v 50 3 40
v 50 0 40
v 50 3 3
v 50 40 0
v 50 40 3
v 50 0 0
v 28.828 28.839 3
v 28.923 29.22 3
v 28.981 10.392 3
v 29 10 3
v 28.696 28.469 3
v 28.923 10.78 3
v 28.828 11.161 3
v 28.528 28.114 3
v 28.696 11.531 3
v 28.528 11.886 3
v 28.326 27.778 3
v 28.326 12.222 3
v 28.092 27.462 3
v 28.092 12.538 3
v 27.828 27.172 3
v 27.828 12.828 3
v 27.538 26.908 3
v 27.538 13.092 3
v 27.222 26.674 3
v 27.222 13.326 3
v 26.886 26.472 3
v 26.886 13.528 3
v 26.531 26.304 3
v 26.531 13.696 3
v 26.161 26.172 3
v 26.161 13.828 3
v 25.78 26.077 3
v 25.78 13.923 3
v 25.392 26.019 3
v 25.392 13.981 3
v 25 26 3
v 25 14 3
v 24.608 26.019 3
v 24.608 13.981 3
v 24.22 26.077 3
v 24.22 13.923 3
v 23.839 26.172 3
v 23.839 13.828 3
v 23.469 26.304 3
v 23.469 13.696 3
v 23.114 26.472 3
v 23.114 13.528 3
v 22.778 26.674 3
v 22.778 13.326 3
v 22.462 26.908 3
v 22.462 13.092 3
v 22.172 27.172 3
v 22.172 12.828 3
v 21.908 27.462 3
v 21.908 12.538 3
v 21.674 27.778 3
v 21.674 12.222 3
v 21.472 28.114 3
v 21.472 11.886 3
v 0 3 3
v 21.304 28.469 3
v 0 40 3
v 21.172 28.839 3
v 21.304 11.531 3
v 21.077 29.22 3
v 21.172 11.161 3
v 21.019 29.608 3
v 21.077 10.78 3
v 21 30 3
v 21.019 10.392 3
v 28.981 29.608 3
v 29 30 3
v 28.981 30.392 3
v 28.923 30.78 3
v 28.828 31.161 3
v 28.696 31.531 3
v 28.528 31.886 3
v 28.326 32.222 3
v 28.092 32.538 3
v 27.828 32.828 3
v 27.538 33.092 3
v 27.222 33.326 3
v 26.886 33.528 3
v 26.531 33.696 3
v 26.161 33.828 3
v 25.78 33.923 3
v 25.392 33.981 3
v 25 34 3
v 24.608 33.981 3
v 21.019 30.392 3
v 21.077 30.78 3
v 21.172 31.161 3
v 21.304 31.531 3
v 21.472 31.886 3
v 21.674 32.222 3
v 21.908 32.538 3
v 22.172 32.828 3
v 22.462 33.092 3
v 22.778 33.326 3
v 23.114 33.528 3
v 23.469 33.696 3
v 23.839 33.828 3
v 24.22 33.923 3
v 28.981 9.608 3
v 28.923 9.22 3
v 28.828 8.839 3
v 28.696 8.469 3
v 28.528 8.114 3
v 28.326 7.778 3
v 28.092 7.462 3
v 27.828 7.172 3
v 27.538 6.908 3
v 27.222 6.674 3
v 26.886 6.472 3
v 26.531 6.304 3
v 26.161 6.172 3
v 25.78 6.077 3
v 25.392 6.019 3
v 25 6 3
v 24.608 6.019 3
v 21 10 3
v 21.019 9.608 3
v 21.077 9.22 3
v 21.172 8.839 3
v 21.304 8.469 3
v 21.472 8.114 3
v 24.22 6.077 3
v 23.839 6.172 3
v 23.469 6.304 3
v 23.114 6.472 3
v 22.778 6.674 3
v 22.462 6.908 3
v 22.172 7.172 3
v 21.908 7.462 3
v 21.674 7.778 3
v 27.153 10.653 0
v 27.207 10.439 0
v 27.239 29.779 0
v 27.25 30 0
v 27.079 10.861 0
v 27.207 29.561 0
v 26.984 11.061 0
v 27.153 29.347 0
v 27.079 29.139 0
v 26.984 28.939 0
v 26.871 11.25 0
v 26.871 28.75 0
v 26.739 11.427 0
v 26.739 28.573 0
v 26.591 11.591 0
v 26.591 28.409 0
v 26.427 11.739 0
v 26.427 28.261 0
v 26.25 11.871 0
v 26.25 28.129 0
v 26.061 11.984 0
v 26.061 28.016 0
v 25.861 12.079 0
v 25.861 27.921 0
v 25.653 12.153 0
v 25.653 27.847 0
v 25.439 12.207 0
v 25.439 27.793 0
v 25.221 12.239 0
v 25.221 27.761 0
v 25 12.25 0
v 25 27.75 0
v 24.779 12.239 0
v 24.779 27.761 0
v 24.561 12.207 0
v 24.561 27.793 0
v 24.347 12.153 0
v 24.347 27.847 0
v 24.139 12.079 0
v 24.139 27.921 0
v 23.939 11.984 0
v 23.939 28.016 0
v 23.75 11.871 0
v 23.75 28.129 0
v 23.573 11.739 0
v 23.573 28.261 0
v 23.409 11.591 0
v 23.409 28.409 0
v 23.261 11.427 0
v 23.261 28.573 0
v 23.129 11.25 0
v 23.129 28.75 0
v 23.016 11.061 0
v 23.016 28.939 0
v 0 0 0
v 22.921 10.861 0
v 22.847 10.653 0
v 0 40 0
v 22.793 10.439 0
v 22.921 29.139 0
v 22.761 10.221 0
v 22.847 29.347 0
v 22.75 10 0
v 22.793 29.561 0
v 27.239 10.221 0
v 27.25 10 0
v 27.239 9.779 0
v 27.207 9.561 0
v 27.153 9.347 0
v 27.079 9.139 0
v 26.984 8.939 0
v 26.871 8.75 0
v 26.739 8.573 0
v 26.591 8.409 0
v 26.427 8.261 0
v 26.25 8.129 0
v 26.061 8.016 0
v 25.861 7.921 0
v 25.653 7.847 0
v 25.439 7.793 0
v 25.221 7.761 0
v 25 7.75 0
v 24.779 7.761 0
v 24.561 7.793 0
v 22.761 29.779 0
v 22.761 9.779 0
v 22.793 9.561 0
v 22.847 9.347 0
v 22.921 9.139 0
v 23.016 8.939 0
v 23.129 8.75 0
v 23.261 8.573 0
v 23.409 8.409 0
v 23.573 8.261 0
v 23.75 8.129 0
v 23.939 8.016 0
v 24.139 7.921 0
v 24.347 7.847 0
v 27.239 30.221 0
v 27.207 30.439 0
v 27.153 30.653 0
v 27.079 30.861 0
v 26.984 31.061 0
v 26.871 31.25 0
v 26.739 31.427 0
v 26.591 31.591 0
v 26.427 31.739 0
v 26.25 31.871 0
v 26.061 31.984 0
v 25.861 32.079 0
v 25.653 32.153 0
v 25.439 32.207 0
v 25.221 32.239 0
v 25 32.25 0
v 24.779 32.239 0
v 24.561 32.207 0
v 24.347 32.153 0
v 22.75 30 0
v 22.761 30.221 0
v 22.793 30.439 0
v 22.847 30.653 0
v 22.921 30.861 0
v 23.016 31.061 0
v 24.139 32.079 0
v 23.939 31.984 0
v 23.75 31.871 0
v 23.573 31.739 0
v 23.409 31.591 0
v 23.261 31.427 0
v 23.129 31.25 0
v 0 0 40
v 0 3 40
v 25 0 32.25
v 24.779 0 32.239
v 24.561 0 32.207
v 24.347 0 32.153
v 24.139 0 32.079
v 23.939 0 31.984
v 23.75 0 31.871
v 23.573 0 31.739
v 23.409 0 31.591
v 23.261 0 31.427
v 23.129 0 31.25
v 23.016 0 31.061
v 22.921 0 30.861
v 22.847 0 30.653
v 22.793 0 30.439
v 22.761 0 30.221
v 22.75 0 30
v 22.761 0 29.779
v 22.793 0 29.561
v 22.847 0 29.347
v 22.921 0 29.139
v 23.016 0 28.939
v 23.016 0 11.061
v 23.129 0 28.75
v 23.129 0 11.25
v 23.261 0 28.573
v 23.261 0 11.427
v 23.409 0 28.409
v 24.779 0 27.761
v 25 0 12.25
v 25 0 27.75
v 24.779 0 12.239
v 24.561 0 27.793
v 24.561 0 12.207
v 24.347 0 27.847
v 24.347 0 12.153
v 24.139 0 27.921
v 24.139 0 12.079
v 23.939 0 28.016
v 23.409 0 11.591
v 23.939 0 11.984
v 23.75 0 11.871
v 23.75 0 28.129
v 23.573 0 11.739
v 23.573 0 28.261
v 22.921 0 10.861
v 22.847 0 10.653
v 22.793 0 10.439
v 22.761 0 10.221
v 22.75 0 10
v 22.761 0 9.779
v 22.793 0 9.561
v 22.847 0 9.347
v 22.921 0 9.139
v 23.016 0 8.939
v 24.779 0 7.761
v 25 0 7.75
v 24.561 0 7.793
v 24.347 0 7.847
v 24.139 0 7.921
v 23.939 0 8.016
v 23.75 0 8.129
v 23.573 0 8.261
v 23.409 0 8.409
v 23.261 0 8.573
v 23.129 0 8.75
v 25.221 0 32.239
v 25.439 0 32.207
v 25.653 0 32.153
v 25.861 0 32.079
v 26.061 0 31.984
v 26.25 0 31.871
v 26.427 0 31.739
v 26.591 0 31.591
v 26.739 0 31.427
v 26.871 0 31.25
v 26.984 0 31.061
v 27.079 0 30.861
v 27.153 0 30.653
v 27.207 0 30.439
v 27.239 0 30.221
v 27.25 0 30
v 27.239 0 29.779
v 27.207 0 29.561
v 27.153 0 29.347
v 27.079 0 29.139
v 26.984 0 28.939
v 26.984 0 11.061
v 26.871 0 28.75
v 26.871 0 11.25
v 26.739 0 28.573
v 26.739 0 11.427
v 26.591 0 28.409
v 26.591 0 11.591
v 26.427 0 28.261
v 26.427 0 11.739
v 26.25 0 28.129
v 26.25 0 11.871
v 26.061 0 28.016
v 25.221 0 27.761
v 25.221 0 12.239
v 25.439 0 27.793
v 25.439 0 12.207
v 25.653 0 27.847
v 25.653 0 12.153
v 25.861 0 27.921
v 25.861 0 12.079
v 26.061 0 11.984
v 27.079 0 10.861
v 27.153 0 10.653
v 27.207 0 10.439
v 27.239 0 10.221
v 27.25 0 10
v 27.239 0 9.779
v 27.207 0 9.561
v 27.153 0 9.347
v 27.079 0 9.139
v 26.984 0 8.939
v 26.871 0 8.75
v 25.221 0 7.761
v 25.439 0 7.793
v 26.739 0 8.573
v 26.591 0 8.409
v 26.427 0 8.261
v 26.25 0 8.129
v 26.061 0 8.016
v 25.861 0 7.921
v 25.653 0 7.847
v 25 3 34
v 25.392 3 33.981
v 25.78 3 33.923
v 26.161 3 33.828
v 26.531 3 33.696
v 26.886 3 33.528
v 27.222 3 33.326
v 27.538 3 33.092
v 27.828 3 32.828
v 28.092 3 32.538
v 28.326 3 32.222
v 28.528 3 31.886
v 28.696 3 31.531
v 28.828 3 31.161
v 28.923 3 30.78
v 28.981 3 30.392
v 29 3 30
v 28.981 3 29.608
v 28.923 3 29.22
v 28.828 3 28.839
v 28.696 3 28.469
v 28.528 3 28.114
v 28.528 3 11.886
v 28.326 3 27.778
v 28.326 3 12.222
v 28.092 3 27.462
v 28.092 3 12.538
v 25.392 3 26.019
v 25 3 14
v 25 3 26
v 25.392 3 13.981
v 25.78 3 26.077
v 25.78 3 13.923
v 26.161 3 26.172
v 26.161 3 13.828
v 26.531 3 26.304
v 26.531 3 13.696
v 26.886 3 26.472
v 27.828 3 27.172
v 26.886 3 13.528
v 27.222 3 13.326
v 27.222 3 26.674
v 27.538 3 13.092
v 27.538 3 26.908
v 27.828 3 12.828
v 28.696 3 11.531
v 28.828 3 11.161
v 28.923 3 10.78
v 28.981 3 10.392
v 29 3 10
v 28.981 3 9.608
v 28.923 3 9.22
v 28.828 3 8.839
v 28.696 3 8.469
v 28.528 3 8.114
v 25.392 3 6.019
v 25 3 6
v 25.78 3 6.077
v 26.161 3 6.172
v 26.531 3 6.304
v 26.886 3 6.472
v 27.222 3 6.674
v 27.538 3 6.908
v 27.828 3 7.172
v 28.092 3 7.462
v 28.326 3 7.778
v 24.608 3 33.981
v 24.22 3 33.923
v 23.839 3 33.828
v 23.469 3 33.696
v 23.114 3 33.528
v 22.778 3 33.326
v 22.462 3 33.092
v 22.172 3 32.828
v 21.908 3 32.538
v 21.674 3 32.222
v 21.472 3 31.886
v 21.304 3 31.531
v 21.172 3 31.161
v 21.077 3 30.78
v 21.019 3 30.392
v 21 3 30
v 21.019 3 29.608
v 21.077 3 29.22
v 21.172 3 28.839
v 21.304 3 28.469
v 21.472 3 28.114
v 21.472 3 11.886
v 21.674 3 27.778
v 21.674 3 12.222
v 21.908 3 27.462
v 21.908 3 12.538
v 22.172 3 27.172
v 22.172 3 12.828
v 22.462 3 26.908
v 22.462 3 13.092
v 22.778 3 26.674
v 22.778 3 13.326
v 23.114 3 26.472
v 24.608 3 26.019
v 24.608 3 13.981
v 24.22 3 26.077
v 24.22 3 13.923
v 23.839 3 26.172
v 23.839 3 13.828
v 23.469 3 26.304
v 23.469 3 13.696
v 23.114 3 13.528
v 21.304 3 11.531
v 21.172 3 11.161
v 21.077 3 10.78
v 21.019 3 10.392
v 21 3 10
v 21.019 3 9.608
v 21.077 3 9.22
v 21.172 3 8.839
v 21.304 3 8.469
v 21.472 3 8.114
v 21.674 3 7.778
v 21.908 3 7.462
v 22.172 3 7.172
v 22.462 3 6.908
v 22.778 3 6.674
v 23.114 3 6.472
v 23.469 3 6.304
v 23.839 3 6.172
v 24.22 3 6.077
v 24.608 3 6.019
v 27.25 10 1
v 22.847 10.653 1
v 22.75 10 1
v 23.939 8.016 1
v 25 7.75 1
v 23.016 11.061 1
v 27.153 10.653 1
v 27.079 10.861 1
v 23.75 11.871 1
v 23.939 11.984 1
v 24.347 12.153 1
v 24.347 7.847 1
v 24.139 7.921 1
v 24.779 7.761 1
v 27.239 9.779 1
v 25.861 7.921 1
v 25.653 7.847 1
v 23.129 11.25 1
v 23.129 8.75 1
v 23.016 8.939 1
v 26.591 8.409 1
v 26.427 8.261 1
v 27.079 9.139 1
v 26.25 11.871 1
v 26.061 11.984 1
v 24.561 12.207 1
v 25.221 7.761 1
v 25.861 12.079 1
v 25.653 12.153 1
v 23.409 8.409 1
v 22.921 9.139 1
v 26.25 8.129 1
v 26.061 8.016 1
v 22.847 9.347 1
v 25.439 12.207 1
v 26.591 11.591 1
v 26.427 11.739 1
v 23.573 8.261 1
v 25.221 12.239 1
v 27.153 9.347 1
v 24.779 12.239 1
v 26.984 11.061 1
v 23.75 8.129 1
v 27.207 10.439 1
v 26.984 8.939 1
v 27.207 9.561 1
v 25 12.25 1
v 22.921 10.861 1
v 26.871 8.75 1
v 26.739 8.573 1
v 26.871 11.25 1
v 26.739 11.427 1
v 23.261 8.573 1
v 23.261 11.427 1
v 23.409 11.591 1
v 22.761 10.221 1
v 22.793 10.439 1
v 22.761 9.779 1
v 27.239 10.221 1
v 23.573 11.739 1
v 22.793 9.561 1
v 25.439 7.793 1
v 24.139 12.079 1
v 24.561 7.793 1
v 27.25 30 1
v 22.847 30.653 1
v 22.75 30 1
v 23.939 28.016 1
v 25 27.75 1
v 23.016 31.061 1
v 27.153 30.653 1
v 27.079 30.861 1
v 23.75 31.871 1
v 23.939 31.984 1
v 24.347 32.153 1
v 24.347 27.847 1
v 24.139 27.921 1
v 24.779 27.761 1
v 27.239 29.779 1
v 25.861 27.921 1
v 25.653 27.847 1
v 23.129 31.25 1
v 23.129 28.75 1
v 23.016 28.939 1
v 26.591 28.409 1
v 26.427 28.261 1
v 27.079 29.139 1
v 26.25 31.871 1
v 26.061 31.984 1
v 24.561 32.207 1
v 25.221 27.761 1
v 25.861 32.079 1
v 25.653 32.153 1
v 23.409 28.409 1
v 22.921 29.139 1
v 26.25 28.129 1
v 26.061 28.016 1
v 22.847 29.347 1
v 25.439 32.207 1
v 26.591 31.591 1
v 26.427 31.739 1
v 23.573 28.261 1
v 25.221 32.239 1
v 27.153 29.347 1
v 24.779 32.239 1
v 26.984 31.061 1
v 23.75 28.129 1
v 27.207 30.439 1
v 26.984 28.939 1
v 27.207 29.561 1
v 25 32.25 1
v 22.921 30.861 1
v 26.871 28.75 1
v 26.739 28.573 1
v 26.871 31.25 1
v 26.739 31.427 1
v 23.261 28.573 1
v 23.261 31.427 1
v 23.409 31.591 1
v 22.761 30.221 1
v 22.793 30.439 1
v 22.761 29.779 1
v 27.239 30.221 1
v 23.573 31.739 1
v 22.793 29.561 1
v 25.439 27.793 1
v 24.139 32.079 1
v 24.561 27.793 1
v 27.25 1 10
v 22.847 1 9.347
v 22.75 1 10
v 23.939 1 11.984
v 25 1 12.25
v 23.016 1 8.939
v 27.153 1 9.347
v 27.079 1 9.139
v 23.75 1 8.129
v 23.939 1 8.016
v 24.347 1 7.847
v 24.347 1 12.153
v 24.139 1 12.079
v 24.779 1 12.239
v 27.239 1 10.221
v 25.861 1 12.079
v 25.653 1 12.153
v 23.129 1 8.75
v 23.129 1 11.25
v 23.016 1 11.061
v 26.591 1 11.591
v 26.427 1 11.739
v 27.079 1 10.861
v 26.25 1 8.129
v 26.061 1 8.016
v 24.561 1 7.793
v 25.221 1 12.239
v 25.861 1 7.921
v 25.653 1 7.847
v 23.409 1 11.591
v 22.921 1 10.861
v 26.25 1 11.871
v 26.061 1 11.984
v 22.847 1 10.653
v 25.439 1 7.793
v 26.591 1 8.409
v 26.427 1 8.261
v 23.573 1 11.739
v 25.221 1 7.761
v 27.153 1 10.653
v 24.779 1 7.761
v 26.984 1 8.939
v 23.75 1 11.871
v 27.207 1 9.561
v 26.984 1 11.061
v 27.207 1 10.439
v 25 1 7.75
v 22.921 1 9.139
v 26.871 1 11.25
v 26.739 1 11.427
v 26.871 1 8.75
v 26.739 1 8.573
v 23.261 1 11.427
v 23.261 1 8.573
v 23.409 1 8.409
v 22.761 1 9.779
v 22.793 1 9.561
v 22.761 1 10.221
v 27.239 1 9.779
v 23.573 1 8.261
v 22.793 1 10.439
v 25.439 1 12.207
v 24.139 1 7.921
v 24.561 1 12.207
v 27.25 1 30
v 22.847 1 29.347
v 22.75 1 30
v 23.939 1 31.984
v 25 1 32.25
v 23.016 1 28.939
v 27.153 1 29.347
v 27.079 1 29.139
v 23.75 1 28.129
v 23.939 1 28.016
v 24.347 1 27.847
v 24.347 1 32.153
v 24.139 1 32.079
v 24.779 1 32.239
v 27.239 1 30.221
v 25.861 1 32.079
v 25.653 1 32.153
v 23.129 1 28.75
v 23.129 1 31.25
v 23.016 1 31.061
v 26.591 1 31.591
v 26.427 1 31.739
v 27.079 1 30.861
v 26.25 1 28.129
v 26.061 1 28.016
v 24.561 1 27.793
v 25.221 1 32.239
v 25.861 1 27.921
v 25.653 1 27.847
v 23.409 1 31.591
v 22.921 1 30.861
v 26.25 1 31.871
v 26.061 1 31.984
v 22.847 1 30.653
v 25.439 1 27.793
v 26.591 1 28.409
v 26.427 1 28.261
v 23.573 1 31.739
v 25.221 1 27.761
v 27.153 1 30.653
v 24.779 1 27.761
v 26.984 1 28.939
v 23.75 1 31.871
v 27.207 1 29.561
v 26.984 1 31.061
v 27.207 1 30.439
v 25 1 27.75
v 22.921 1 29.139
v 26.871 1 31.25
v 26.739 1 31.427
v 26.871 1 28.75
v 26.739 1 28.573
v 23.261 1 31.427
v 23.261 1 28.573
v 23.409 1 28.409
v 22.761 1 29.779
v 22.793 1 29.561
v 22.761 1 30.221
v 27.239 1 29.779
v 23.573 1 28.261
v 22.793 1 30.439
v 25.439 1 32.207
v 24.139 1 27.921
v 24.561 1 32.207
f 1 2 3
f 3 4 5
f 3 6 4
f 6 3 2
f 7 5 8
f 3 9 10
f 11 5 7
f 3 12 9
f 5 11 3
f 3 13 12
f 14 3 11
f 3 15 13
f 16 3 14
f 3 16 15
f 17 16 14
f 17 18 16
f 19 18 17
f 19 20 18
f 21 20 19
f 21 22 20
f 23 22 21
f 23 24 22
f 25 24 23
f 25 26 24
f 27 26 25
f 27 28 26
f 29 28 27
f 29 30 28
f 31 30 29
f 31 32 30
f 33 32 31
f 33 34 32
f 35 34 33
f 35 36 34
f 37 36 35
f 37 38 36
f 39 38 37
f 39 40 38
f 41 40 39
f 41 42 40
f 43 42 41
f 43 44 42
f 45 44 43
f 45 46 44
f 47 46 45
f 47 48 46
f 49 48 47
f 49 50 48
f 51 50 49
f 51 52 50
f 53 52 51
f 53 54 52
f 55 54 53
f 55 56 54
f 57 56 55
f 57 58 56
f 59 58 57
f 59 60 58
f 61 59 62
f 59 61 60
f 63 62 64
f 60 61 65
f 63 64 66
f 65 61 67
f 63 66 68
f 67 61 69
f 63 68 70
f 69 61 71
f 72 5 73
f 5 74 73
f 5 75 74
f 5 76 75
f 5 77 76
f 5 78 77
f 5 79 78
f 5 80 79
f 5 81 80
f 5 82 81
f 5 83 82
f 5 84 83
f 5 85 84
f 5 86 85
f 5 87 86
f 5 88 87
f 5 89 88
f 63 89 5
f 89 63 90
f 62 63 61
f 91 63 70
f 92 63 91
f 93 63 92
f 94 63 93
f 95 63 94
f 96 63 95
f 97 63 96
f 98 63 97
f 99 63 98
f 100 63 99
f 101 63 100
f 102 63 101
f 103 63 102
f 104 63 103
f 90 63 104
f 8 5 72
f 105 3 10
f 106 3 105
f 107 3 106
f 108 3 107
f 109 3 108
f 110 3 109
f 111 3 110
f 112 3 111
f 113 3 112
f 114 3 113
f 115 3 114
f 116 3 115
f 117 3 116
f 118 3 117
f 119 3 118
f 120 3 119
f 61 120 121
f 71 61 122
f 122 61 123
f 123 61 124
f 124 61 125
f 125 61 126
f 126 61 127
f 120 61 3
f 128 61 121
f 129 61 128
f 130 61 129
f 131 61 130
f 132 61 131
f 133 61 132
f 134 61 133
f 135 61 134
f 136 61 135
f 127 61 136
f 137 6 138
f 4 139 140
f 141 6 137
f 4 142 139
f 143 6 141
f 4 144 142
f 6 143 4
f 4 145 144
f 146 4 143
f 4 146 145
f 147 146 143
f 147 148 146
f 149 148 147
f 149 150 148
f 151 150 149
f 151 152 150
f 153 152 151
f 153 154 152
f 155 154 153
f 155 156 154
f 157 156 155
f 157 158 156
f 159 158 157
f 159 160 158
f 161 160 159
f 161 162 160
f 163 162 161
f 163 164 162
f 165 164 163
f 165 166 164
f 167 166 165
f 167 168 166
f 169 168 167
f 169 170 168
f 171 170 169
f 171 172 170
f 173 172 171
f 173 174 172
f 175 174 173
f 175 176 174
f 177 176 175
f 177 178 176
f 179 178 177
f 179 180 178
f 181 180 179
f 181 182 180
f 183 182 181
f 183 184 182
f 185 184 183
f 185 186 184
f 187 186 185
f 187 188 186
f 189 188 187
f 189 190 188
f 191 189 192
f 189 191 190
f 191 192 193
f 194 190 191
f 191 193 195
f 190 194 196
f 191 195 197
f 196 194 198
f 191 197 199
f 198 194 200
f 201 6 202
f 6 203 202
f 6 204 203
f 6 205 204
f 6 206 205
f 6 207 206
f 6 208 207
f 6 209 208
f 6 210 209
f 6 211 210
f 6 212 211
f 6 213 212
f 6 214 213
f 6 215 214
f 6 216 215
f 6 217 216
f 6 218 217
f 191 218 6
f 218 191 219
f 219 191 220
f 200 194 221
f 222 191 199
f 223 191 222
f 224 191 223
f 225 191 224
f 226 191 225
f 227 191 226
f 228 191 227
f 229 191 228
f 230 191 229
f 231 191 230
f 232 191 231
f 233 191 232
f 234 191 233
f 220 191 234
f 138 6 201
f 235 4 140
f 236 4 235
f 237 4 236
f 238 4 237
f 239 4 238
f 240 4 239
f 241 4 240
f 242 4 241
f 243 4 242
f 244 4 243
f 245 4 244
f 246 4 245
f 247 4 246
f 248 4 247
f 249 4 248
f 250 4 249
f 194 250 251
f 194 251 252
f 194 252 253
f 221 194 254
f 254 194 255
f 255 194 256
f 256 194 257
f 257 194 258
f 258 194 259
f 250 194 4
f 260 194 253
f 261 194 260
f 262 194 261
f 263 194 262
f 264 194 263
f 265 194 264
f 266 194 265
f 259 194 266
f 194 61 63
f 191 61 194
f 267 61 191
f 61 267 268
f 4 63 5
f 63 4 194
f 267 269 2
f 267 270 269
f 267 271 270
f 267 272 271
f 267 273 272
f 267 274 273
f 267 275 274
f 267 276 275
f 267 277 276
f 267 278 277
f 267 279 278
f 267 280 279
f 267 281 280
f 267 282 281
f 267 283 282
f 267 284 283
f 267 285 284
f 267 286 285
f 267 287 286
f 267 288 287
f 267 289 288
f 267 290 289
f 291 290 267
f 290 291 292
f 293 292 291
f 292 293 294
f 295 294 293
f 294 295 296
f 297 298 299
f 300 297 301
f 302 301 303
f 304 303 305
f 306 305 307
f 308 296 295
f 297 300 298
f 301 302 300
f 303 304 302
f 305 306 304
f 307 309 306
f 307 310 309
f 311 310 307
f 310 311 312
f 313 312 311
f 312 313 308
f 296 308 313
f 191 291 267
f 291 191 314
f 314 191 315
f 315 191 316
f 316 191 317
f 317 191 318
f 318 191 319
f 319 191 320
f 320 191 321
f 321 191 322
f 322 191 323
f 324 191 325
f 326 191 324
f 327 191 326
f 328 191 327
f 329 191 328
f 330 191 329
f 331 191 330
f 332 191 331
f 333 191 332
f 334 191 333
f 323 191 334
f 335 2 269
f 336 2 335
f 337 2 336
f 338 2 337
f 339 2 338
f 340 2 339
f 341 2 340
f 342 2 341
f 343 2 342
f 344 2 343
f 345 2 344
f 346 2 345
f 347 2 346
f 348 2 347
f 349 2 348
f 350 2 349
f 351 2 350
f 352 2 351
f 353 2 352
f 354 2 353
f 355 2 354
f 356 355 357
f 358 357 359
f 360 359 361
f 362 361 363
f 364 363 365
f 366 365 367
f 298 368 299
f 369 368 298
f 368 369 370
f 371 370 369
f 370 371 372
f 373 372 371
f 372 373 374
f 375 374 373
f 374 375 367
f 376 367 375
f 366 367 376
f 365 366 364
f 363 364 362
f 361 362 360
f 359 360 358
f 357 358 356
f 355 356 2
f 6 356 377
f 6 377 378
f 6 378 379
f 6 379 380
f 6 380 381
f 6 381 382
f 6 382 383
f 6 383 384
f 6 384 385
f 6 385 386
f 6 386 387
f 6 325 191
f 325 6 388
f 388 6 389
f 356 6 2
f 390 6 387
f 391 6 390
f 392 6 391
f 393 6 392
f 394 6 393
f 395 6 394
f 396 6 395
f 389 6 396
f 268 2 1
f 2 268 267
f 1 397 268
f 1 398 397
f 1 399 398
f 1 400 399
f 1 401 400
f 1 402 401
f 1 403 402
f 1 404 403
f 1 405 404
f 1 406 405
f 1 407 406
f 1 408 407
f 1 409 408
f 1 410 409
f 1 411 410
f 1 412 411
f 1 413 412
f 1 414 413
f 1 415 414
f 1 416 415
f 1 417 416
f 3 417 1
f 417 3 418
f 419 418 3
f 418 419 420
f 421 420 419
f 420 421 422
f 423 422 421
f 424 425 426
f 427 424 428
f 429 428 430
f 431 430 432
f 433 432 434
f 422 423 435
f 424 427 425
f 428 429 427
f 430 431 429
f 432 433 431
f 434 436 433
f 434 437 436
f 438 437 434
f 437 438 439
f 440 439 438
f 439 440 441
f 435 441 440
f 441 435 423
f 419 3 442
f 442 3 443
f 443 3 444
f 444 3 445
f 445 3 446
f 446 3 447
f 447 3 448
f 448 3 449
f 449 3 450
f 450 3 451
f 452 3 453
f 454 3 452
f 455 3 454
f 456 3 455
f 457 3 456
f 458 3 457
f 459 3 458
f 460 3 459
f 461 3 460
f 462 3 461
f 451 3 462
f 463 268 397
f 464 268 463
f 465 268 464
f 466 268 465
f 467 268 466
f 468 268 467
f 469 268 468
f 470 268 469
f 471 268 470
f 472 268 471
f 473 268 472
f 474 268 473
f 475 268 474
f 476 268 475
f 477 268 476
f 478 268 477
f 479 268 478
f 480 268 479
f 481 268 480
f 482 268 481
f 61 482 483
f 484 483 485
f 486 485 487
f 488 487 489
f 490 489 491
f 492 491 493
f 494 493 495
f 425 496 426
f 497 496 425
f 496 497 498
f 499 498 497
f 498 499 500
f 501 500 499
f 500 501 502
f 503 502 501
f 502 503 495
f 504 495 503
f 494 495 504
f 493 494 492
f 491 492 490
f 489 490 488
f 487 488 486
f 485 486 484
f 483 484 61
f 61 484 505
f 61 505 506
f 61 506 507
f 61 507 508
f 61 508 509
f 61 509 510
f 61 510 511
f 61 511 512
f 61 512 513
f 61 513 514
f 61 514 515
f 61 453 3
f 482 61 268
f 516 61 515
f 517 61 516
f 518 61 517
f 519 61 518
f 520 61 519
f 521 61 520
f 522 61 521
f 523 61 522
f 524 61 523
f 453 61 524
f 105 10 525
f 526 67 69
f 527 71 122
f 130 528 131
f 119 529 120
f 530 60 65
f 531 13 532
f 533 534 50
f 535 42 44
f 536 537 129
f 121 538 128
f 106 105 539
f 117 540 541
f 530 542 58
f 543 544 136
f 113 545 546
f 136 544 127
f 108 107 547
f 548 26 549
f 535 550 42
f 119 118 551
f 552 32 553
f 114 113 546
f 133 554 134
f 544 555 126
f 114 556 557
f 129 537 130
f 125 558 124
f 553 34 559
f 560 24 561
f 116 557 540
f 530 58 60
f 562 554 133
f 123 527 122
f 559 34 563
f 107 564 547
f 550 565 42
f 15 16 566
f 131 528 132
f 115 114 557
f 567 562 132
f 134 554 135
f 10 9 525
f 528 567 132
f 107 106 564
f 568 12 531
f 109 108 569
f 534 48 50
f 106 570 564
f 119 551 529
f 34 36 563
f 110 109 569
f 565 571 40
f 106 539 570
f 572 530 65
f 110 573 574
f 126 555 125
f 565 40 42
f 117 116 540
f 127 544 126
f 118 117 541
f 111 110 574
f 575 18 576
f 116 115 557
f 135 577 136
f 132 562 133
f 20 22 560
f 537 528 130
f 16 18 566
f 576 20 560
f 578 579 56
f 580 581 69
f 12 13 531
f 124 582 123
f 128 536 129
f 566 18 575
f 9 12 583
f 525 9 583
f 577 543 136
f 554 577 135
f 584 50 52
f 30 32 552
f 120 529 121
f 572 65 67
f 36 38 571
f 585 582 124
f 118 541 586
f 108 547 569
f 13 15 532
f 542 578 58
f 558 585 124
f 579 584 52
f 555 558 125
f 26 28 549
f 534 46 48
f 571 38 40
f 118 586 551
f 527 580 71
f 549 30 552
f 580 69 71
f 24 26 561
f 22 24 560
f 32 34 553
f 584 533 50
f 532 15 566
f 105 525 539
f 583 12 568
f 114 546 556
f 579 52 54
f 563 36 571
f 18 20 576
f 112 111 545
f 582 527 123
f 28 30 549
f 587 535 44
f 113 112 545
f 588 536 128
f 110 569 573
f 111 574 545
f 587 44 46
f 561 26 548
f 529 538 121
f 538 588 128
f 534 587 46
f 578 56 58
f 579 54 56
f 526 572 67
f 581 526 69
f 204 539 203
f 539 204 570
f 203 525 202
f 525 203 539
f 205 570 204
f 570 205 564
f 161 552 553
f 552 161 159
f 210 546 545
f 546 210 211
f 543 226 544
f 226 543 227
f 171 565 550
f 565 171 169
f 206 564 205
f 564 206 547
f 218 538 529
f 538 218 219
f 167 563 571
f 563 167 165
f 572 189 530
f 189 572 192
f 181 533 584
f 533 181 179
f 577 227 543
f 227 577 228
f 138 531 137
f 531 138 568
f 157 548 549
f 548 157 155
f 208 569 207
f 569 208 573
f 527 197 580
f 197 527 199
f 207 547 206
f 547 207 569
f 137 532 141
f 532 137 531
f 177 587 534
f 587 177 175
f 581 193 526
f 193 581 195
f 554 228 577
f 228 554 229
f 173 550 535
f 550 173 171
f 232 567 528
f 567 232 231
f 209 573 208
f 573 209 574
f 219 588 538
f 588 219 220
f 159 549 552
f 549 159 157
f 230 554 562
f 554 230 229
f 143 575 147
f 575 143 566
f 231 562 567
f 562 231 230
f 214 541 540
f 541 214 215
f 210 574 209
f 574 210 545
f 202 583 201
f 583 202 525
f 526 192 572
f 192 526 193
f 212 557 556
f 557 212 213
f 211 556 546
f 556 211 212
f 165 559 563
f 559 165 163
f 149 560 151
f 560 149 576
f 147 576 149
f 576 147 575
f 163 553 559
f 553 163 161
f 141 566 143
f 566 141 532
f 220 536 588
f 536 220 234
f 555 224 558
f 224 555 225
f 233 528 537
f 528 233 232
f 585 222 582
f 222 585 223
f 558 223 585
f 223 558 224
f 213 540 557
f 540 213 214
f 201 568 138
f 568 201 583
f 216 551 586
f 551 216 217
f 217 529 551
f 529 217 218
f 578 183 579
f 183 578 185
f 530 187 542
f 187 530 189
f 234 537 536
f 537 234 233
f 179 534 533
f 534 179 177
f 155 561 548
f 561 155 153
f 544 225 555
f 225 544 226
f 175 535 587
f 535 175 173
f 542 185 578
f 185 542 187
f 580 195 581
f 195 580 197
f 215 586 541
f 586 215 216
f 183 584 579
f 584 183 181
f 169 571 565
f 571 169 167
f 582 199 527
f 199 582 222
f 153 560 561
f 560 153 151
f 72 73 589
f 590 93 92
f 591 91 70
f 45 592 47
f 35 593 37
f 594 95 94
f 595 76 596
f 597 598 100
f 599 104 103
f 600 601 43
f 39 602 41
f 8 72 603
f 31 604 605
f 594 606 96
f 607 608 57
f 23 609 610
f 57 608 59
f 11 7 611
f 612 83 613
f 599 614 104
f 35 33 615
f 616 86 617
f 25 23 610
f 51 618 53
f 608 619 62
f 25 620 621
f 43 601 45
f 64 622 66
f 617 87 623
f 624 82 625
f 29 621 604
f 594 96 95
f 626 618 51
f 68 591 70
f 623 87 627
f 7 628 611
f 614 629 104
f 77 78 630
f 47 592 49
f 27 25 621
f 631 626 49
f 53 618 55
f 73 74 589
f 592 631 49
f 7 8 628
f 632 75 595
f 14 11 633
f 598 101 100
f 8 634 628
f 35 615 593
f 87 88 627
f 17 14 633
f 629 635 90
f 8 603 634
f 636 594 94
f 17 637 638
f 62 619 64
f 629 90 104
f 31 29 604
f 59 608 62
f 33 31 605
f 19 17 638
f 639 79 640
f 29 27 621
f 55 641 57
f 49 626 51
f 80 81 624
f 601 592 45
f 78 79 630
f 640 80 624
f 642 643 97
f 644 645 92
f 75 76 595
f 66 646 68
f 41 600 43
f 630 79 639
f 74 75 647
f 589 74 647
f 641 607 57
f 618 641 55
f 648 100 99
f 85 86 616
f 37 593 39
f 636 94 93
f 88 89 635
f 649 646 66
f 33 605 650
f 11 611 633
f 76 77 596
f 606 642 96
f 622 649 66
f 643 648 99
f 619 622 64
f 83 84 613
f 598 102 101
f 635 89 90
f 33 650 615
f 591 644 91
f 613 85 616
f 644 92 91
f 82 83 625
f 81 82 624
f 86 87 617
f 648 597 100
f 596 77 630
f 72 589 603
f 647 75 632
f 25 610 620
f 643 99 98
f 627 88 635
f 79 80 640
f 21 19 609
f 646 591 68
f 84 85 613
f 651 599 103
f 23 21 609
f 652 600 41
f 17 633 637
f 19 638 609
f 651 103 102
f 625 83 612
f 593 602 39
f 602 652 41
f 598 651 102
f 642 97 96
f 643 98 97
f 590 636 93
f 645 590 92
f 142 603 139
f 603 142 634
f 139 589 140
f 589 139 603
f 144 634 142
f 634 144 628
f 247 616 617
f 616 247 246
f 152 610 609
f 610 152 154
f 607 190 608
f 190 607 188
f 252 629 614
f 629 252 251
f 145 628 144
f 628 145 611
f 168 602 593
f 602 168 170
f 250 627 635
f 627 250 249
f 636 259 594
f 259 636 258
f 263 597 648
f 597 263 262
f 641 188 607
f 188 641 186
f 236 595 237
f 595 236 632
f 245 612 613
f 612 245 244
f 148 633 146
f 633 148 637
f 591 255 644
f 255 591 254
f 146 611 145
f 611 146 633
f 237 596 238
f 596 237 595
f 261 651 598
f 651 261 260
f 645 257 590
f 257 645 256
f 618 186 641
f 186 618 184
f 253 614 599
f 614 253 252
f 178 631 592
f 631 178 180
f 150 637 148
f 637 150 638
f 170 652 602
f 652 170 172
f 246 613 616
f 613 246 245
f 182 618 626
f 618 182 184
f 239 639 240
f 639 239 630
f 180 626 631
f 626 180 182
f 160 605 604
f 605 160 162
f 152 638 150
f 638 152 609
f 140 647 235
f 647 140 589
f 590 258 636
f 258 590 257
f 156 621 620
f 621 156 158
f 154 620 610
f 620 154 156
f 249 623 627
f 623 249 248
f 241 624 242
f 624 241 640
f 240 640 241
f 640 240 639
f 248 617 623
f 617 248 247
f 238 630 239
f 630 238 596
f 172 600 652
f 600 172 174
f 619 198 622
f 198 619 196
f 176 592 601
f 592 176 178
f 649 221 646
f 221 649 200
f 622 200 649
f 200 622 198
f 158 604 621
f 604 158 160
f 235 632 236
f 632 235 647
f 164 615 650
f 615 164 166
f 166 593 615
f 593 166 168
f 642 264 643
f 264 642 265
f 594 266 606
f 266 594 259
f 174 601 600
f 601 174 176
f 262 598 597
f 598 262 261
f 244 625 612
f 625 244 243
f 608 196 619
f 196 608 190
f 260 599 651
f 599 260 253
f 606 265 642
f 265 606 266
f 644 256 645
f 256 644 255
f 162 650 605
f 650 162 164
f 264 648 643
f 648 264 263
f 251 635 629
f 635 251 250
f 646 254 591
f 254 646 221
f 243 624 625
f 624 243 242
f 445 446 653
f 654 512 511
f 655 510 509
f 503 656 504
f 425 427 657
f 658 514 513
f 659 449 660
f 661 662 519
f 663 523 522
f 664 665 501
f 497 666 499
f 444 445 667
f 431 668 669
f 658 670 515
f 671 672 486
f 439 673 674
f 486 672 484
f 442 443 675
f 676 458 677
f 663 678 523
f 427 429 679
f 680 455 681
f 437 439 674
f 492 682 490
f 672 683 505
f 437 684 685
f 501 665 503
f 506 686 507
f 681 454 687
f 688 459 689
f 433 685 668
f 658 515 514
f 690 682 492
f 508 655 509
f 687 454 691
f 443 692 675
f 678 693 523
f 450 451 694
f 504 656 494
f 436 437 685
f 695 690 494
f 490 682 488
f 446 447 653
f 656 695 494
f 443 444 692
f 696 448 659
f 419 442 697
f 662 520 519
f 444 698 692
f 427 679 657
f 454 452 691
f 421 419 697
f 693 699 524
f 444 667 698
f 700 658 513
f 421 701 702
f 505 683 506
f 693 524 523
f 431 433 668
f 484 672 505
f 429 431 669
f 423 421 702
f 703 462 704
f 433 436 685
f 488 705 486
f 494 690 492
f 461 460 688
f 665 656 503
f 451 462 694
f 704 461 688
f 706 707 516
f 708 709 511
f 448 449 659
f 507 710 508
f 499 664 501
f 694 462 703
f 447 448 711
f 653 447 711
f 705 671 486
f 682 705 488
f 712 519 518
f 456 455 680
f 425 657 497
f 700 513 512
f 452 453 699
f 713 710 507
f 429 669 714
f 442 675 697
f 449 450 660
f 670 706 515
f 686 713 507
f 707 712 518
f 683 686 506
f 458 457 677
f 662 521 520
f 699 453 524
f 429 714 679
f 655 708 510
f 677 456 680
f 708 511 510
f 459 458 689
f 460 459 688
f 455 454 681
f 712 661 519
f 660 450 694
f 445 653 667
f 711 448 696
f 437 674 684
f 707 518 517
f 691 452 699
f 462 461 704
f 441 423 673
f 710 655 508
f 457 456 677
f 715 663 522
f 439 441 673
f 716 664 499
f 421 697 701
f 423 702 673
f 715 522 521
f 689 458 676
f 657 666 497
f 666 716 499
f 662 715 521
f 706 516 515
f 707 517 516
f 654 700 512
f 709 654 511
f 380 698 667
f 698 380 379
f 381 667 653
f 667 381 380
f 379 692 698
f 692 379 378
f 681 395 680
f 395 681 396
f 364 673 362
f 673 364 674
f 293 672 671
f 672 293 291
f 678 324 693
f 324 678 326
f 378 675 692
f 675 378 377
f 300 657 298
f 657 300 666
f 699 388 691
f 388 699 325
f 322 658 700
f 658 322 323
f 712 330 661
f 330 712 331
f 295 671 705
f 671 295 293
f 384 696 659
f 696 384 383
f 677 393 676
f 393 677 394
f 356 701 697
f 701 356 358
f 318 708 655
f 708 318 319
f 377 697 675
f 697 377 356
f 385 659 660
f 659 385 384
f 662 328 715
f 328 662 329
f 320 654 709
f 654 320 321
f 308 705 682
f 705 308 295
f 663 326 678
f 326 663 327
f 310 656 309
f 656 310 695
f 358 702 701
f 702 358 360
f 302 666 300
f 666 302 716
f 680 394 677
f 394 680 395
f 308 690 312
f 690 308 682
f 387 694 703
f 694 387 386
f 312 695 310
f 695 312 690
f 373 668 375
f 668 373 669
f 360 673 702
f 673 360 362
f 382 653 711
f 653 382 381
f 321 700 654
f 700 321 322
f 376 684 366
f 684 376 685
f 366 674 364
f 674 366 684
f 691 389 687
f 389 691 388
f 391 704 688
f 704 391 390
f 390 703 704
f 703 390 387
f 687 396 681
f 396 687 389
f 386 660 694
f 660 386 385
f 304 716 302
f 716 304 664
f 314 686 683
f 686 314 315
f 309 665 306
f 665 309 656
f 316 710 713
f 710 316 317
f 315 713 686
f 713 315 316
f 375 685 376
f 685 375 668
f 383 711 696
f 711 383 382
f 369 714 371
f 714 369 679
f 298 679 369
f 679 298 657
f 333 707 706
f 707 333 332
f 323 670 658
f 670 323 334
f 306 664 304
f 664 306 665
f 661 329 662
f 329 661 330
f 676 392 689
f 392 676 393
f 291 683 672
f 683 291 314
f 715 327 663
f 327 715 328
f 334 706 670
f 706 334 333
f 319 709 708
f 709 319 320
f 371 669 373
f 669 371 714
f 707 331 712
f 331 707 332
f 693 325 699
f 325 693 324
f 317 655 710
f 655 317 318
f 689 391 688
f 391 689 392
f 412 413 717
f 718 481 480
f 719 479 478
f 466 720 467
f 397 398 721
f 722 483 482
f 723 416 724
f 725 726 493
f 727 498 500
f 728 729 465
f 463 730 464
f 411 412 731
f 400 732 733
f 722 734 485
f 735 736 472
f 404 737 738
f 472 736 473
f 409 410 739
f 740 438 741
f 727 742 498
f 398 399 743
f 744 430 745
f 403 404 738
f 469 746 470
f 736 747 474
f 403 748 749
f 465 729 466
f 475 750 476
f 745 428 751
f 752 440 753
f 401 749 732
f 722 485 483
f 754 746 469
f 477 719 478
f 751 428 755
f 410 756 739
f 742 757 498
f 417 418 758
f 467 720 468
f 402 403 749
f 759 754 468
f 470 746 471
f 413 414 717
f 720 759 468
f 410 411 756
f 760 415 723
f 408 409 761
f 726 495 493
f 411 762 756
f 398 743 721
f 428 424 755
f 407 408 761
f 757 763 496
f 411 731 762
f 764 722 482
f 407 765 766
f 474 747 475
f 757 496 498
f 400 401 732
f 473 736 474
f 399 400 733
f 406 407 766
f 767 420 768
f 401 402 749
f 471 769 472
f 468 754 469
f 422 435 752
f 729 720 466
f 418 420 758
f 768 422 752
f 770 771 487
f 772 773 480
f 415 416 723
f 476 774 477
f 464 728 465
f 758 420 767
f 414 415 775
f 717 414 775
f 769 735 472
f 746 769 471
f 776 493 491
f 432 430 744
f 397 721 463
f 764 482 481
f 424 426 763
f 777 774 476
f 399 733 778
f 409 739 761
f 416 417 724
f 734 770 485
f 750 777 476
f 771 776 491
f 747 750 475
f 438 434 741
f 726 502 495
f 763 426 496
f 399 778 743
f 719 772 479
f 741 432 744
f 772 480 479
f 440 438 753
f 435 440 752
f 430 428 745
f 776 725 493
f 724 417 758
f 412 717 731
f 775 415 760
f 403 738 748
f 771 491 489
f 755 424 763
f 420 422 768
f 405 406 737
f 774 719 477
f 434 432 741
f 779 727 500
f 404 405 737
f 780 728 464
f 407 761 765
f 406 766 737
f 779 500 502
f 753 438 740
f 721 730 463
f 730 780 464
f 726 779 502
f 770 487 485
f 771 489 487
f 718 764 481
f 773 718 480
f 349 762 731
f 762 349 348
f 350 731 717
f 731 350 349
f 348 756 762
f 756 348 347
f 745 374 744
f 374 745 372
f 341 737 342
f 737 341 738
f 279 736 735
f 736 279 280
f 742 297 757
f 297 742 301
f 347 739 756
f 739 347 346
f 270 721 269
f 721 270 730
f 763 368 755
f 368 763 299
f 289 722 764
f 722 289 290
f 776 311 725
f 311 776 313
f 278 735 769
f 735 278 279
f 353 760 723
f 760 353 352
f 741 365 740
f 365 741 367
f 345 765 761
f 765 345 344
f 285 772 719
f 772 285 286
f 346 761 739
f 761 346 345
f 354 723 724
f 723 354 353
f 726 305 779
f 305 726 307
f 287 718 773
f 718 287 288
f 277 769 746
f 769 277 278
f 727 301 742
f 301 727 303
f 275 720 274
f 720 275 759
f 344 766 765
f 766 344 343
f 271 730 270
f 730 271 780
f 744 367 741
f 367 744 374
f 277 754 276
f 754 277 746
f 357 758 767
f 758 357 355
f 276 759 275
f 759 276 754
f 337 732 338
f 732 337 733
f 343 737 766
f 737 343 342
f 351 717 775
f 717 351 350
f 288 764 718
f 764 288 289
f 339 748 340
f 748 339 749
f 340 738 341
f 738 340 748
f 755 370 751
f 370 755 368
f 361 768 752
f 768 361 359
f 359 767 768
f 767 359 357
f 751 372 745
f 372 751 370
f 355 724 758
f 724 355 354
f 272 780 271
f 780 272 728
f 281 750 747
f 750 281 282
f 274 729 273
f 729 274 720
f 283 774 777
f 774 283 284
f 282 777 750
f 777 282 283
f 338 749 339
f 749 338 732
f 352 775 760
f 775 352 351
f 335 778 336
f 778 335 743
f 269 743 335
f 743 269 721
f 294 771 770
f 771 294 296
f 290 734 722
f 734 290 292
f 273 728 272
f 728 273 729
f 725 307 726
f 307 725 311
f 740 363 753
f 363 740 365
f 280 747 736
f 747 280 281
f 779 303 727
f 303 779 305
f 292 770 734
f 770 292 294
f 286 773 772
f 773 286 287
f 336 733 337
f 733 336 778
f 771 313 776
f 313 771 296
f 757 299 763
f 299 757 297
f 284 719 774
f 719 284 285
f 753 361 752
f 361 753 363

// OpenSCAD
// L-bracket parameters
flange_width = 50;
flange_depth_horiz = 40;
flange_height_vert = 40;
plate_thickness = 3;

// Countersunk hole parameters (M4 screw)
// M4 specifies a major diameter of 4mm.
// A common clearance hole diameter is 4.5mm.
// A common countersunk head diameter is 8mm, with a depth of 2mm.
cs_hole_depth_cs = 2; // Depth of the conical countersunk part
cs_hole_radius_top = 8 / 2; // Radius at the top of the countersunk part
cs_hole_radius_bottom = 4.5 / 2; // Radius at the bottom of the countersunk part (same as through hole)
thru_hole_radius = 4.5 / 2; // Radius of the straight through hole

// Overall depth for the hole operation to ensure complete cut through the plate
hole_overall_depth = plate_thickness + 2; // plate_thickness (3mm) + extra (2mm) = 5mm

// Hole placement parameters
hole_margin = 10; // Distance from the edge to the center of the hole

// Module for a countersunk hole, defined to originate at [0,0,0] and extend along the +Z axis.
// This allows easy rotation and translation to position the holes.
module countersunk_hole_m4() {
    union() {
        // Conical countersunk part
        cylinder(h = cs_hole_depth_cs, r1 = cs_hole_radius_top, r2 = cs_hole_radius_bottom, $fn = 64);
        // Straight through hole part, starting from where the countersunk part ends
        translate([0, 0, cs_hole_depth_cs])
        cylinder(h = hole_overall_depth - cs_hole_depth_cs, r = thru_hole_radius, $fn = 64);
    }
}

difference() {
    // 1. Main L-bracket shape
    union() {
        // Horizontal flange:
        // Dimensions: [width, depth, thickness] = [50mm, 40mm, 3mm]
        // Placed with inner corner at [0,0,0].
        // Extends from X=0 to 50, Y=0 to 40, Z=0 to 3.
        // +Y direction is depth, +Z direction is upwards (thickness).
        cube([flange_width, flange_depth_horiz, plate_thickness]);

        // Vertical flange:
        // Dimensions: [width, thickness, height] = [50mm, 3mm, 40mm]
        // Placed with inner corner at [0,0,0].
        // Extends from X=0 to 50, Y=0 to 3, Z=0 to 40.
        // +Y direction is thickness (into the bracket), +Z direction is height.
        cube([flange_width, plate_thickness, flange_height_vert]);
    }

    // 2. Countersunk holes to subtract from the bracket
    // The countersunk_hole_m4 module creates a hole along +Z.
    // We need to translate and rotate it to match the desired position and orientation.

    // Horizontal flange holes:
    // Located on the top surface (Z = plate_thickness), facing outwards (downwards, -Z).
    // X-coordinate: Center of the flange (flange_width / 2).
    // Y-coordinates: hole_margin and (flange_depth_horiz - hole_margin).
    // Z-coordinate: Top surface of the flange (plate_thickness).
    // Rotation: [180, 0, 0] to make the hole point downwards (-Z).
    translate([flange_width / 2, hole_margin, plate_thickness])
    rotate([180, 0, 0]) // Rotate 180 deg around X-axis to point hole downwards
    countersunk_hole_m4();

    translate([flange_width / 2, flange_depth_horiz - hole_margin, plate_thickness])
    rotate([180, 0, 0]) // Rotate 180 deg around X-axis to point hole downwards
    countersunk_hole_m4();

    // Vertical flange holes:
    // Located on the front surface (Y = plate_thickness), facing outwards (towards +Y).
    // X-coordinate: Center of the flange (flange_width / 2).
    // Y-coordinate: Front surface of the flange (plate_thickness).
    // Z-coordinates: hole_margin and (flange_height_vert - hole_margin).
    // Rotation: [90, 0, 0] to make the hole point towards +Y.
    translate([flange_width / 2, plate_thickness, hole_margin])
    rotate([90, 0, 0]) // Rotate 90 deg around X-axis to point hole towards +Y
    countersunk_hole_m4();

    translate([flange_width / 2, plate_thickness, flange_height_vert - hole_margin])
    rotate([90, 0, 0]) // Rotate 90 deg around X-axis to point hole towards +Y
    countersunk_hole_m4();
}
